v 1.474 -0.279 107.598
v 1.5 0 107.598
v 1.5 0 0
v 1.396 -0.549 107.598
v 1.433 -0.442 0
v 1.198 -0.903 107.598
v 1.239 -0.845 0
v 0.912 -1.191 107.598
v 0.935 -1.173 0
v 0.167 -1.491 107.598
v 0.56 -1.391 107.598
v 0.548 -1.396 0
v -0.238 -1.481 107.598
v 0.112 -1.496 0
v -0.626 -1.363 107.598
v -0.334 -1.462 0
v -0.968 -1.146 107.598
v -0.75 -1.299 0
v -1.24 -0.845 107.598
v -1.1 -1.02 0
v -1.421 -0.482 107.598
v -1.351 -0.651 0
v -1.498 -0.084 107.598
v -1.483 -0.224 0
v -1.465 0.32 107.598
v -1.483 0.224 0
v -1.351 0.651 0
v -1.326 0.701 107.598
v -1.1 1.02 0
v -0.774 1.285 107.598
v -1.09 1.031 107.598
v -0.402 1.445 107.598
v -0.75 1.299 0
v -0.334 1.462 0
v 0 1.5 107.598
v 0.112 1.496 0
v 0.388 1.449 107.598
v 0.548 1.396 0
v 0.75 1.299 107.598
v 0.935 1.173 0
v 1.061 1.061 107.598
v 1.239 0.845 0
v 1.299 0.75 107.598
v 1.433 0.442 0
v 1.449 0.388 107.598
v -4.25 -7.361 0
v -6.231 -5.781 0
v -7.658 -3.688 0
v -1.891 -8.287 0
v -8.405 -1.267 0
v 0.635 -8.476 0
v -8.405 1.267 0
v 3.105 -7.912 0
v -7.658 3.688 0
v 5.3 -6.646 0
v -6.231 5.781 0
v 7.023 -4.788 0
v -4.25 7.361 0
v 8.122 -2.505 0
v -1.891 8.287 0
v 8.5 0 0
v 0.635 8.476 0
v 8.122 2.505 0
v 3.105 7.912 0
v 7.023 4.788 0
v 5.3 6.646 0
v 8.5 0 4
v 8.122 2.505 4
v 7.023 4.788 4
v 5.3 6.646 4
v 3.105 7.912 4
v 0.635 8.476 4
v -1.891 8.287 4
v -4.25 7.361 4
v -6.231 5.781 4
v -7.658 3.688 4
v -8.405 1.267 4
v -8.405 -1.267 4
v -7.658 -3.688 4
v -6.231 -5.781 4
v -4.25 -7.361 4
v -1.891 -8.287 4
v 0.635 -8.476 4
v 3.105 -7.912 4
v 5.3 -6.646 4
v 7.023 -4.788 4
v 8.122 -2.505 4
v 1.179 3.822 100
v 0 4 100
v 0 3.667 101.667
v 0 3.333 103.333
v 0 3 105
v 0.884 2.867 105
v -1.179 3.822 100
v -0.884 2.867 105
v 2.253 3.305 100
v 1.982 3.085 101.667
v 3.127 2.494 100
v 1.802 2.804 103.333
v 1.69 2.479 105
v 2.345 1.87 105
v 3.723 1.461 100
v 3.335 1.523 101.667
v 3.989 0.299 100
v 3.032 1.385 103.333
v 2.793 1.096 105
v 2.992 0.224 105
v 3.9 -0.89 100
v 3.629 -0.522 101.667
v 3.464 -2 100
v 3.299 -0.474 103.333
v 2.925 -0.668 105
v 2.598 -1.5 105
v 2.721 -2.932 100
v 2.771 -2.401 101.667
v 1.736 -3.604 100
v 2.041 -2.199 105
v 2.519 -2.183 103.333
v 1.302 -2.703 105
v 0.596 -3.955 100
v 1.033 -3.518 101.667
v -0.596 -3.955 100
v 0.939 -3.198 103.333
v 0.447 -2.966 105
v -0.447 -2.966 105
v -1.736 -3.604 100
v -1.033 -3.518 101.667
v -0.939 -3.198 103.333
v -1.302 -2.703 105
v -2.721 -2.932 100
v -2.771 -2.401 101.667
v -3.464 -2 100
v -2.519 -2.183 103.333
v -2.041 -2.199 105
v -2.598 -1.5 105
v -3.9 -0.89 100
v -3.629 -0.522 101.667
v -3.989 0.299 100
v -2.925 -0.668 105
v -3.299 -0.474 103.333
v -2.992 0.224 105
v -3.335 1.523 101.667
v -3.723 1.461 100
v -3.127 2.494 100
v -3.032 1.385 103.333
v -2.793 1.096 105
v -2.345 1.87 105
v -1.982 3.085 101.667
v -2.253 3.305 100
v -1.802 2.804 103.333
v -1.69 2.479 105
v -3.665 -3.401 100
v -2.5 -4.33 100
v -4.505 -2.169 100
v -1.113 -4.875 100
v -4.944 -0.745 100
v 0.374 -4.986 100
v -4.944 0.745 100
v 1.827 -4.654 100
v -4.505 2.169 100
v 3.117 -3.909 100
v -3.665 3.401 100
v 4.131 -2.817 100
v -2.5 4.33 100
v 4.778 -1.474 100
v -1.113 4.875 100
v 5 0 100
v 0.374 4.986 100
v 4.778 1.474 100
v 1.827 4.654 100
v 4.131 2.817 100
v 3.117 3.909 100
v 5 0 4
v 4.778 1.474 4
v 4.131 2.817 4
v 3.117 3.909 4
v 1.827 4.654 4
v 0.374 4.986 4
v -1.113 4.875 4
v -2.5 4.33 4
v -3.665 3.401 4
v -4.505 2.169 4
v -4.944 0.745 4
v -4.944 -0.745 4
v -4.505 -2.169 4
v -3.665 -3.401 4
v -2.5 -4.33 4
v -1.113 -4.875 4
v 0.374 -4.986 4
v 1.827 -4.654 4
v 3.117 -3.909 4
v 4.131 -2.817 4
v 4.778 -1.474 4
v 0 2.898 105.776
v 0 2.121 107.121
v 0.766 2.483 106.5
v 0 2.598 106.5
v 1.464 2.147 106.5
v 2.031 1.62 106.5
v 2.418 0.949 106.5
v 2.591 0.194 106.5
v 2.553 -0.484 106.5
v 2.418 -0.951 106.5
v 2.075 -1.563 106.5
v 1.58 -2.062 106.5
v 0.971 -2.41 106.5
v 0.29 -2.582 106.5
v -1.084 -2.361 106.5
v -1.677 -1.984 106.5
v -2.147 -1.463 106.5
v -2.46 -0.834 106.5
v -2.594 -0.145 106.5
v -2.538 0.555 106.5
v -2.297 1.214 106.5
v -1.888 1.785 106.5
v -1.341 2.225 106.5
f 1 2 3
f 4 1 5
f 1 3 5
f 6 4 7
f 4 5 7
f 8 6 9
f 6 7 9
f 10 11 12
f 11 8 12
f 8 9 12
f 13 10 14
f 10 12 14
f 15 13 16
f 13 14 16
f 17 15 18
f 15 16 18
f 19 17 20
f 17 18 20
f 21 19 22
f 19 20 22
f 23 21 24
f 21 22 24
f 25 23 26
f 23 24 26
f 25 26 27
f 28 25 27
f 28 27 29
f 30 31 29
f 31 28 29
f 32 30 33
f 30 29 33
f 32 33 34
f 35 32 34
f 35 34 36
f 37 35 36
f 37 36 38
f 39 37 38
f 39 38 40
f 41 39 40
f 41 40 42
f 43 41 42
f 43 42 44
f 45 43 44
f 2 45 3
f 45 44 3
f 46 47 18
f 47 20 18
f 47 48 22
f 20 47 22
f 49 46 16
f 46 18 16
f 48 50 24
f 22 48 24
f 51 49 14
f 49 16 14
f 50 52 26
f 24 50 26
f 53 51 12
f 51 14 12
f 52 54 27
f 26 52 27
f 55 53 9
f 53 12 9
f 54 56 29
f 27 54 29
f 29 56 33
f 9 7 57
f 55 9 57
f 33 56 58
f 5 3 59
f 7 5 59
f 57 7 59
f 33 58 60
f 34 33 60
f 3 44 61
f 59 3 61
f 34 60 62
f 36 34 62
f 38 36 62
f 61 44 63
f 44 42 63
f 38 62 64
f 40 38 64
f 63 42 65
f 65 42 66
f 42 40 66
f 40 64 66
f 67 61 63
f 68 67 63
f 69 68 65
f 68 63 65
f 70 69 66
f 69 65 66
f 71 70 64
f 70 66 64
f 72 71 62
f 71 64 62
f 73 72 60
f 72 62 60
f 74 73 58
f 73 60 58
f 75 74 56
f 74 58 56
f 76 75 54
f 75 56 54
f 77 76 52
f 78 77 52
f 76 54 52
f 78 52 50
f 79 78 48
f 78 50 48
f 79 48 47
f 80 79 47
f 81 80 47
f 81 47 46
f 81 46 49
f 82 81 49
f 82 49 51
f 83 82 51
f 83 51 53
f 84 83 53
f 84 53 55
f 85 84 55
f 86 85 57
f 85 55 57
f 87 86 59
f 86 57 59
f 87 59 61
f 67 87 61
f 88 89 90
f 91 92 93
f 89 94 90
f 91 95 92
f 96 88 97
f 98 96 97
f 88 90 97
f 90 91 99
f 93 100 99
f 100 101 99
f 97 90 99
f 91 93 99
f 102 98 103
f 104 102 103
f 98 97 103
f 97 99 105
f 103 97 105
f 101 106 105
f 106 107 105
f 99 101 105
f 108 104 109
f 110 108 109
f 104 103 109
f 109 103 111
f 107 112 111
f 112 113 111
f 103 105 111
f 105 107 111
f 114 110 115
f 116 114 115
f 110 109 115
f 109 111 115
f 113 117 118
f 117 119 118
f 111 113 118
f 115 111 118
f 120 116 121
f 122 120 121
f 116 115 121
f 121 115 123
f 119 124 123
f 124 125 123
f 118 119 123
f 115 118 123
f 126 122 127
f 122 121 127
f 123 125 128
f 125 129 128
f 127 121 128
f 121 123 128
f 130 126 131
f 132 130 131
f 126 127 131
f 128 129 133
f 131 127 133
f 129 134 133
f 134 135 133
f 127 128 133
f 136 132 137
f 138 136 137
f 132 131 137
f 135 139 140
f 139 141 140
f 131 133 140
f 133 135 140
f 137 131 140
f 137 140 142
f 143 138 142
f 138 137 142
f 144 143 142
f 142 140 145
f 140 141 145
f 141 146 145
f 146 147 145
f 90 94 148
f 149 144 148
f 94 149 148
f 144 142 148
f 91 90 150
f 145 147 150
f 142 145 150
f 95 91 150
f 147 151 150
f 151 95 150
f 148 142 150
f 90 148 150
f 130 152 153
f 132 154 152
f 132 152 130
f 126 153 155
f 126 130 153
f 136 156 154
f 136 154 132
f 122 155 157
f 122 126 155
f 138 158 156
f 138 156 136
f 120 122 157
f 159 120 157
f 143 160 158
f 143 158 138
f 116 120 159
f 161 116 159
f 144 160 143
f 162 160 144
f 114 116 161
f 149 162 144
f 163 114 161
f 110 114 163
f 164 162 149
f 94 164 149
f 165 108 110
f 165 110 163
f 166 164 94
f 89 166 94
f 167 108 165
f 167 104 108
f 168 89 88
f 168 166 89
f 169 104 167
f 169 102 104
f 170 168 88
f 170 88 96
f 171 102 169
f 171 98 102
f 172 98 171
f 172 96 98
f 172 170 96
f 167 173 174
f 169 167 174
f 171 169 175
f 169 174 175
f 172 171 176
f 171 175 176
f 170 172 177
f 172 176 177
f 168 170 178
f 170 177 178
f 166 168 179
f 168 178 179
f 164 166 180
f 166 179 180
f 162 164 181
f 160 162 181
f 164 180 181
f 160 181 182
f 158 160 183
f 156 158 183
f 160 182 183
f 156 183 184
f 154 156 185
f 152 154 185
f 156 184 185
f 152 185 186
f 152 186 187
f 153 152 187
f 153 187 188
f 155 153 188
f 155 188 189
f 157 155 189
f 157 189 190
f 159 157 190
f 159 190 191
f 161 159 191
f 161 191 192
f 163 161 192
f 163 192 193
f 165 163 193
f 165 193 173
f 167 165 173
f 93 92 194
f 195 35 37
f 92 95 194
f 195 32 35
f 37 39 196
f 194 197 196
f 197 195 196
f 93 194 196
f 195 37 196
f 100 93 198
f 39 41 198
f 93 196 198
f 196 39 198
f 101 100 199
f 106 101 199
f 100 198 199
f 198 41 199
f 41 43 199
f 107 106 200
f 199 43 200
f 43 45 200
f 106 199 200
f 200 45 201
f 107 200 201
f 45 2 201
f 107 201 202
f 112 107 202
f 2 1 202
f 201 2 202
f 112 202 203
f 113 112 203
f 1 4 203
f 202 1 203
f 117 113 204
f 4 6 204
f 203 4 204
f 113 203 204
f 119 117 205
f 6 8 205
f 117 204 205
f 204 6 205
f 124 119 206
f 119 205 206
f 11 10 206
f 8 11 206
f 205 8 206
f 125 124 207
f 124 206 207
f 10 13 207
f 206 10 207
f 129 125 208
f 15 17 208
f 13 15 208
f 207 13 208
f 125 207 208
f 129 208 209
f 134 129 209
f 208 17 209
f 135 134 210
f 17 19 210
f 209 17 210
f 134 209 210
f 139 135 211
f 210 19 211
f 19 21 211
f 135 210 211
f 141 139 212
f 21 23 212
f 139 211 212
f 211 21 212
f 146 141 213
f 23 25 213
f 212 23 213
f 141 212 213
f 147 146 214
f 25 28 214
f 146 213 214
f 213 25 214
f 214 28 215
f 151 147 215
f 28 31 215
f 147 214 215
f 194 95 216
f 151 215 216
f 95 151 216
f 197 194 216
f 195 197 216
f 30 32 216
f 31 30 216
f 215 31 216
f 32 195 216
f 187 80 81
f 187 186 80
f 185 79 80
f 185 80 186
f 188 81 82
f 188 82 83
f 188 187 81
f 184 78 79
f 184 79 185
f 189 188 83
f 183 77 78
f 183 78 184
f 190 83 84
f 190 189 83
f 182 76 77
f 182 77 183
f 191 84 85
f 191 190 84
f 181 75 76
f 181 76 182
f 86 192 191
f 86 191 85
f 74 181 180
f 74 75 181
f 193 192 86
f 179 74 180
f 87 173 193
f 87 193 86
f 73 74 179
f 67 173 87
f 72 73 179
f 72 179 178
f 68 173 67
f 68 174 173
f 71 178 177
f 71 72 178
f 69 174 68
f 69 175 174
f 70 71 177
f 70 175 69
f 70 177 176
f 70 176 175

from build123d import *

# Parameters (mm, degrees)
F0_R     = 8.5
F1_DEPTH = 4
F2_R     = 5
F3_DEPTH = 100
F8_R     = 1.5
F9_DEPTH = 123.9


with BuildPart() as f1:
    # F0 (on Top) → F1 (new body)
    with BuildSketch(Plane.XY):
        Circle(F0_R)
    extrude(amount=F1_DEPTH)

    # F2 (on Top) → F3 (join)
    with BuildSketch(Plane.XY):
        Circle(F2_R)
    extrude(amount=F3_DEPTH)

    # F4 (on Right) → F5 (revolve)
    with BuildSketch(Plane.YZ):
        Polygon((3, 105), (0, 105), (0, 100), (4, 100), align=None)
    revolve(axis=Axis((0, 0, 102.5), (0, 0, -1)))

    # F6 (on Right) → F7 (revolve)
    with BuildSketch(Plane.YZ):
        with BuildLine():
            ThreePointArc((3, 105), (2.12132, 107.12132), (0, 108))
            Line((0, 108), (0, 105))
            Line((0, 105), (3, 105))
        make_face()
    revolve(axis=Axis((0, 0, 106.5), (0, 0, -1)))

    # F8 (on face) → F9 (cut)
    with BuildSketch(Plane(origin=(0, 0, 0), x_dir=(1, 0, 0), z_dir=(0, 0, -1))):
        Circle(F8_R)
    extrude(amount=-F9_DEPTH, mode=Mode.SUBTRACT)


solid = f1.part
